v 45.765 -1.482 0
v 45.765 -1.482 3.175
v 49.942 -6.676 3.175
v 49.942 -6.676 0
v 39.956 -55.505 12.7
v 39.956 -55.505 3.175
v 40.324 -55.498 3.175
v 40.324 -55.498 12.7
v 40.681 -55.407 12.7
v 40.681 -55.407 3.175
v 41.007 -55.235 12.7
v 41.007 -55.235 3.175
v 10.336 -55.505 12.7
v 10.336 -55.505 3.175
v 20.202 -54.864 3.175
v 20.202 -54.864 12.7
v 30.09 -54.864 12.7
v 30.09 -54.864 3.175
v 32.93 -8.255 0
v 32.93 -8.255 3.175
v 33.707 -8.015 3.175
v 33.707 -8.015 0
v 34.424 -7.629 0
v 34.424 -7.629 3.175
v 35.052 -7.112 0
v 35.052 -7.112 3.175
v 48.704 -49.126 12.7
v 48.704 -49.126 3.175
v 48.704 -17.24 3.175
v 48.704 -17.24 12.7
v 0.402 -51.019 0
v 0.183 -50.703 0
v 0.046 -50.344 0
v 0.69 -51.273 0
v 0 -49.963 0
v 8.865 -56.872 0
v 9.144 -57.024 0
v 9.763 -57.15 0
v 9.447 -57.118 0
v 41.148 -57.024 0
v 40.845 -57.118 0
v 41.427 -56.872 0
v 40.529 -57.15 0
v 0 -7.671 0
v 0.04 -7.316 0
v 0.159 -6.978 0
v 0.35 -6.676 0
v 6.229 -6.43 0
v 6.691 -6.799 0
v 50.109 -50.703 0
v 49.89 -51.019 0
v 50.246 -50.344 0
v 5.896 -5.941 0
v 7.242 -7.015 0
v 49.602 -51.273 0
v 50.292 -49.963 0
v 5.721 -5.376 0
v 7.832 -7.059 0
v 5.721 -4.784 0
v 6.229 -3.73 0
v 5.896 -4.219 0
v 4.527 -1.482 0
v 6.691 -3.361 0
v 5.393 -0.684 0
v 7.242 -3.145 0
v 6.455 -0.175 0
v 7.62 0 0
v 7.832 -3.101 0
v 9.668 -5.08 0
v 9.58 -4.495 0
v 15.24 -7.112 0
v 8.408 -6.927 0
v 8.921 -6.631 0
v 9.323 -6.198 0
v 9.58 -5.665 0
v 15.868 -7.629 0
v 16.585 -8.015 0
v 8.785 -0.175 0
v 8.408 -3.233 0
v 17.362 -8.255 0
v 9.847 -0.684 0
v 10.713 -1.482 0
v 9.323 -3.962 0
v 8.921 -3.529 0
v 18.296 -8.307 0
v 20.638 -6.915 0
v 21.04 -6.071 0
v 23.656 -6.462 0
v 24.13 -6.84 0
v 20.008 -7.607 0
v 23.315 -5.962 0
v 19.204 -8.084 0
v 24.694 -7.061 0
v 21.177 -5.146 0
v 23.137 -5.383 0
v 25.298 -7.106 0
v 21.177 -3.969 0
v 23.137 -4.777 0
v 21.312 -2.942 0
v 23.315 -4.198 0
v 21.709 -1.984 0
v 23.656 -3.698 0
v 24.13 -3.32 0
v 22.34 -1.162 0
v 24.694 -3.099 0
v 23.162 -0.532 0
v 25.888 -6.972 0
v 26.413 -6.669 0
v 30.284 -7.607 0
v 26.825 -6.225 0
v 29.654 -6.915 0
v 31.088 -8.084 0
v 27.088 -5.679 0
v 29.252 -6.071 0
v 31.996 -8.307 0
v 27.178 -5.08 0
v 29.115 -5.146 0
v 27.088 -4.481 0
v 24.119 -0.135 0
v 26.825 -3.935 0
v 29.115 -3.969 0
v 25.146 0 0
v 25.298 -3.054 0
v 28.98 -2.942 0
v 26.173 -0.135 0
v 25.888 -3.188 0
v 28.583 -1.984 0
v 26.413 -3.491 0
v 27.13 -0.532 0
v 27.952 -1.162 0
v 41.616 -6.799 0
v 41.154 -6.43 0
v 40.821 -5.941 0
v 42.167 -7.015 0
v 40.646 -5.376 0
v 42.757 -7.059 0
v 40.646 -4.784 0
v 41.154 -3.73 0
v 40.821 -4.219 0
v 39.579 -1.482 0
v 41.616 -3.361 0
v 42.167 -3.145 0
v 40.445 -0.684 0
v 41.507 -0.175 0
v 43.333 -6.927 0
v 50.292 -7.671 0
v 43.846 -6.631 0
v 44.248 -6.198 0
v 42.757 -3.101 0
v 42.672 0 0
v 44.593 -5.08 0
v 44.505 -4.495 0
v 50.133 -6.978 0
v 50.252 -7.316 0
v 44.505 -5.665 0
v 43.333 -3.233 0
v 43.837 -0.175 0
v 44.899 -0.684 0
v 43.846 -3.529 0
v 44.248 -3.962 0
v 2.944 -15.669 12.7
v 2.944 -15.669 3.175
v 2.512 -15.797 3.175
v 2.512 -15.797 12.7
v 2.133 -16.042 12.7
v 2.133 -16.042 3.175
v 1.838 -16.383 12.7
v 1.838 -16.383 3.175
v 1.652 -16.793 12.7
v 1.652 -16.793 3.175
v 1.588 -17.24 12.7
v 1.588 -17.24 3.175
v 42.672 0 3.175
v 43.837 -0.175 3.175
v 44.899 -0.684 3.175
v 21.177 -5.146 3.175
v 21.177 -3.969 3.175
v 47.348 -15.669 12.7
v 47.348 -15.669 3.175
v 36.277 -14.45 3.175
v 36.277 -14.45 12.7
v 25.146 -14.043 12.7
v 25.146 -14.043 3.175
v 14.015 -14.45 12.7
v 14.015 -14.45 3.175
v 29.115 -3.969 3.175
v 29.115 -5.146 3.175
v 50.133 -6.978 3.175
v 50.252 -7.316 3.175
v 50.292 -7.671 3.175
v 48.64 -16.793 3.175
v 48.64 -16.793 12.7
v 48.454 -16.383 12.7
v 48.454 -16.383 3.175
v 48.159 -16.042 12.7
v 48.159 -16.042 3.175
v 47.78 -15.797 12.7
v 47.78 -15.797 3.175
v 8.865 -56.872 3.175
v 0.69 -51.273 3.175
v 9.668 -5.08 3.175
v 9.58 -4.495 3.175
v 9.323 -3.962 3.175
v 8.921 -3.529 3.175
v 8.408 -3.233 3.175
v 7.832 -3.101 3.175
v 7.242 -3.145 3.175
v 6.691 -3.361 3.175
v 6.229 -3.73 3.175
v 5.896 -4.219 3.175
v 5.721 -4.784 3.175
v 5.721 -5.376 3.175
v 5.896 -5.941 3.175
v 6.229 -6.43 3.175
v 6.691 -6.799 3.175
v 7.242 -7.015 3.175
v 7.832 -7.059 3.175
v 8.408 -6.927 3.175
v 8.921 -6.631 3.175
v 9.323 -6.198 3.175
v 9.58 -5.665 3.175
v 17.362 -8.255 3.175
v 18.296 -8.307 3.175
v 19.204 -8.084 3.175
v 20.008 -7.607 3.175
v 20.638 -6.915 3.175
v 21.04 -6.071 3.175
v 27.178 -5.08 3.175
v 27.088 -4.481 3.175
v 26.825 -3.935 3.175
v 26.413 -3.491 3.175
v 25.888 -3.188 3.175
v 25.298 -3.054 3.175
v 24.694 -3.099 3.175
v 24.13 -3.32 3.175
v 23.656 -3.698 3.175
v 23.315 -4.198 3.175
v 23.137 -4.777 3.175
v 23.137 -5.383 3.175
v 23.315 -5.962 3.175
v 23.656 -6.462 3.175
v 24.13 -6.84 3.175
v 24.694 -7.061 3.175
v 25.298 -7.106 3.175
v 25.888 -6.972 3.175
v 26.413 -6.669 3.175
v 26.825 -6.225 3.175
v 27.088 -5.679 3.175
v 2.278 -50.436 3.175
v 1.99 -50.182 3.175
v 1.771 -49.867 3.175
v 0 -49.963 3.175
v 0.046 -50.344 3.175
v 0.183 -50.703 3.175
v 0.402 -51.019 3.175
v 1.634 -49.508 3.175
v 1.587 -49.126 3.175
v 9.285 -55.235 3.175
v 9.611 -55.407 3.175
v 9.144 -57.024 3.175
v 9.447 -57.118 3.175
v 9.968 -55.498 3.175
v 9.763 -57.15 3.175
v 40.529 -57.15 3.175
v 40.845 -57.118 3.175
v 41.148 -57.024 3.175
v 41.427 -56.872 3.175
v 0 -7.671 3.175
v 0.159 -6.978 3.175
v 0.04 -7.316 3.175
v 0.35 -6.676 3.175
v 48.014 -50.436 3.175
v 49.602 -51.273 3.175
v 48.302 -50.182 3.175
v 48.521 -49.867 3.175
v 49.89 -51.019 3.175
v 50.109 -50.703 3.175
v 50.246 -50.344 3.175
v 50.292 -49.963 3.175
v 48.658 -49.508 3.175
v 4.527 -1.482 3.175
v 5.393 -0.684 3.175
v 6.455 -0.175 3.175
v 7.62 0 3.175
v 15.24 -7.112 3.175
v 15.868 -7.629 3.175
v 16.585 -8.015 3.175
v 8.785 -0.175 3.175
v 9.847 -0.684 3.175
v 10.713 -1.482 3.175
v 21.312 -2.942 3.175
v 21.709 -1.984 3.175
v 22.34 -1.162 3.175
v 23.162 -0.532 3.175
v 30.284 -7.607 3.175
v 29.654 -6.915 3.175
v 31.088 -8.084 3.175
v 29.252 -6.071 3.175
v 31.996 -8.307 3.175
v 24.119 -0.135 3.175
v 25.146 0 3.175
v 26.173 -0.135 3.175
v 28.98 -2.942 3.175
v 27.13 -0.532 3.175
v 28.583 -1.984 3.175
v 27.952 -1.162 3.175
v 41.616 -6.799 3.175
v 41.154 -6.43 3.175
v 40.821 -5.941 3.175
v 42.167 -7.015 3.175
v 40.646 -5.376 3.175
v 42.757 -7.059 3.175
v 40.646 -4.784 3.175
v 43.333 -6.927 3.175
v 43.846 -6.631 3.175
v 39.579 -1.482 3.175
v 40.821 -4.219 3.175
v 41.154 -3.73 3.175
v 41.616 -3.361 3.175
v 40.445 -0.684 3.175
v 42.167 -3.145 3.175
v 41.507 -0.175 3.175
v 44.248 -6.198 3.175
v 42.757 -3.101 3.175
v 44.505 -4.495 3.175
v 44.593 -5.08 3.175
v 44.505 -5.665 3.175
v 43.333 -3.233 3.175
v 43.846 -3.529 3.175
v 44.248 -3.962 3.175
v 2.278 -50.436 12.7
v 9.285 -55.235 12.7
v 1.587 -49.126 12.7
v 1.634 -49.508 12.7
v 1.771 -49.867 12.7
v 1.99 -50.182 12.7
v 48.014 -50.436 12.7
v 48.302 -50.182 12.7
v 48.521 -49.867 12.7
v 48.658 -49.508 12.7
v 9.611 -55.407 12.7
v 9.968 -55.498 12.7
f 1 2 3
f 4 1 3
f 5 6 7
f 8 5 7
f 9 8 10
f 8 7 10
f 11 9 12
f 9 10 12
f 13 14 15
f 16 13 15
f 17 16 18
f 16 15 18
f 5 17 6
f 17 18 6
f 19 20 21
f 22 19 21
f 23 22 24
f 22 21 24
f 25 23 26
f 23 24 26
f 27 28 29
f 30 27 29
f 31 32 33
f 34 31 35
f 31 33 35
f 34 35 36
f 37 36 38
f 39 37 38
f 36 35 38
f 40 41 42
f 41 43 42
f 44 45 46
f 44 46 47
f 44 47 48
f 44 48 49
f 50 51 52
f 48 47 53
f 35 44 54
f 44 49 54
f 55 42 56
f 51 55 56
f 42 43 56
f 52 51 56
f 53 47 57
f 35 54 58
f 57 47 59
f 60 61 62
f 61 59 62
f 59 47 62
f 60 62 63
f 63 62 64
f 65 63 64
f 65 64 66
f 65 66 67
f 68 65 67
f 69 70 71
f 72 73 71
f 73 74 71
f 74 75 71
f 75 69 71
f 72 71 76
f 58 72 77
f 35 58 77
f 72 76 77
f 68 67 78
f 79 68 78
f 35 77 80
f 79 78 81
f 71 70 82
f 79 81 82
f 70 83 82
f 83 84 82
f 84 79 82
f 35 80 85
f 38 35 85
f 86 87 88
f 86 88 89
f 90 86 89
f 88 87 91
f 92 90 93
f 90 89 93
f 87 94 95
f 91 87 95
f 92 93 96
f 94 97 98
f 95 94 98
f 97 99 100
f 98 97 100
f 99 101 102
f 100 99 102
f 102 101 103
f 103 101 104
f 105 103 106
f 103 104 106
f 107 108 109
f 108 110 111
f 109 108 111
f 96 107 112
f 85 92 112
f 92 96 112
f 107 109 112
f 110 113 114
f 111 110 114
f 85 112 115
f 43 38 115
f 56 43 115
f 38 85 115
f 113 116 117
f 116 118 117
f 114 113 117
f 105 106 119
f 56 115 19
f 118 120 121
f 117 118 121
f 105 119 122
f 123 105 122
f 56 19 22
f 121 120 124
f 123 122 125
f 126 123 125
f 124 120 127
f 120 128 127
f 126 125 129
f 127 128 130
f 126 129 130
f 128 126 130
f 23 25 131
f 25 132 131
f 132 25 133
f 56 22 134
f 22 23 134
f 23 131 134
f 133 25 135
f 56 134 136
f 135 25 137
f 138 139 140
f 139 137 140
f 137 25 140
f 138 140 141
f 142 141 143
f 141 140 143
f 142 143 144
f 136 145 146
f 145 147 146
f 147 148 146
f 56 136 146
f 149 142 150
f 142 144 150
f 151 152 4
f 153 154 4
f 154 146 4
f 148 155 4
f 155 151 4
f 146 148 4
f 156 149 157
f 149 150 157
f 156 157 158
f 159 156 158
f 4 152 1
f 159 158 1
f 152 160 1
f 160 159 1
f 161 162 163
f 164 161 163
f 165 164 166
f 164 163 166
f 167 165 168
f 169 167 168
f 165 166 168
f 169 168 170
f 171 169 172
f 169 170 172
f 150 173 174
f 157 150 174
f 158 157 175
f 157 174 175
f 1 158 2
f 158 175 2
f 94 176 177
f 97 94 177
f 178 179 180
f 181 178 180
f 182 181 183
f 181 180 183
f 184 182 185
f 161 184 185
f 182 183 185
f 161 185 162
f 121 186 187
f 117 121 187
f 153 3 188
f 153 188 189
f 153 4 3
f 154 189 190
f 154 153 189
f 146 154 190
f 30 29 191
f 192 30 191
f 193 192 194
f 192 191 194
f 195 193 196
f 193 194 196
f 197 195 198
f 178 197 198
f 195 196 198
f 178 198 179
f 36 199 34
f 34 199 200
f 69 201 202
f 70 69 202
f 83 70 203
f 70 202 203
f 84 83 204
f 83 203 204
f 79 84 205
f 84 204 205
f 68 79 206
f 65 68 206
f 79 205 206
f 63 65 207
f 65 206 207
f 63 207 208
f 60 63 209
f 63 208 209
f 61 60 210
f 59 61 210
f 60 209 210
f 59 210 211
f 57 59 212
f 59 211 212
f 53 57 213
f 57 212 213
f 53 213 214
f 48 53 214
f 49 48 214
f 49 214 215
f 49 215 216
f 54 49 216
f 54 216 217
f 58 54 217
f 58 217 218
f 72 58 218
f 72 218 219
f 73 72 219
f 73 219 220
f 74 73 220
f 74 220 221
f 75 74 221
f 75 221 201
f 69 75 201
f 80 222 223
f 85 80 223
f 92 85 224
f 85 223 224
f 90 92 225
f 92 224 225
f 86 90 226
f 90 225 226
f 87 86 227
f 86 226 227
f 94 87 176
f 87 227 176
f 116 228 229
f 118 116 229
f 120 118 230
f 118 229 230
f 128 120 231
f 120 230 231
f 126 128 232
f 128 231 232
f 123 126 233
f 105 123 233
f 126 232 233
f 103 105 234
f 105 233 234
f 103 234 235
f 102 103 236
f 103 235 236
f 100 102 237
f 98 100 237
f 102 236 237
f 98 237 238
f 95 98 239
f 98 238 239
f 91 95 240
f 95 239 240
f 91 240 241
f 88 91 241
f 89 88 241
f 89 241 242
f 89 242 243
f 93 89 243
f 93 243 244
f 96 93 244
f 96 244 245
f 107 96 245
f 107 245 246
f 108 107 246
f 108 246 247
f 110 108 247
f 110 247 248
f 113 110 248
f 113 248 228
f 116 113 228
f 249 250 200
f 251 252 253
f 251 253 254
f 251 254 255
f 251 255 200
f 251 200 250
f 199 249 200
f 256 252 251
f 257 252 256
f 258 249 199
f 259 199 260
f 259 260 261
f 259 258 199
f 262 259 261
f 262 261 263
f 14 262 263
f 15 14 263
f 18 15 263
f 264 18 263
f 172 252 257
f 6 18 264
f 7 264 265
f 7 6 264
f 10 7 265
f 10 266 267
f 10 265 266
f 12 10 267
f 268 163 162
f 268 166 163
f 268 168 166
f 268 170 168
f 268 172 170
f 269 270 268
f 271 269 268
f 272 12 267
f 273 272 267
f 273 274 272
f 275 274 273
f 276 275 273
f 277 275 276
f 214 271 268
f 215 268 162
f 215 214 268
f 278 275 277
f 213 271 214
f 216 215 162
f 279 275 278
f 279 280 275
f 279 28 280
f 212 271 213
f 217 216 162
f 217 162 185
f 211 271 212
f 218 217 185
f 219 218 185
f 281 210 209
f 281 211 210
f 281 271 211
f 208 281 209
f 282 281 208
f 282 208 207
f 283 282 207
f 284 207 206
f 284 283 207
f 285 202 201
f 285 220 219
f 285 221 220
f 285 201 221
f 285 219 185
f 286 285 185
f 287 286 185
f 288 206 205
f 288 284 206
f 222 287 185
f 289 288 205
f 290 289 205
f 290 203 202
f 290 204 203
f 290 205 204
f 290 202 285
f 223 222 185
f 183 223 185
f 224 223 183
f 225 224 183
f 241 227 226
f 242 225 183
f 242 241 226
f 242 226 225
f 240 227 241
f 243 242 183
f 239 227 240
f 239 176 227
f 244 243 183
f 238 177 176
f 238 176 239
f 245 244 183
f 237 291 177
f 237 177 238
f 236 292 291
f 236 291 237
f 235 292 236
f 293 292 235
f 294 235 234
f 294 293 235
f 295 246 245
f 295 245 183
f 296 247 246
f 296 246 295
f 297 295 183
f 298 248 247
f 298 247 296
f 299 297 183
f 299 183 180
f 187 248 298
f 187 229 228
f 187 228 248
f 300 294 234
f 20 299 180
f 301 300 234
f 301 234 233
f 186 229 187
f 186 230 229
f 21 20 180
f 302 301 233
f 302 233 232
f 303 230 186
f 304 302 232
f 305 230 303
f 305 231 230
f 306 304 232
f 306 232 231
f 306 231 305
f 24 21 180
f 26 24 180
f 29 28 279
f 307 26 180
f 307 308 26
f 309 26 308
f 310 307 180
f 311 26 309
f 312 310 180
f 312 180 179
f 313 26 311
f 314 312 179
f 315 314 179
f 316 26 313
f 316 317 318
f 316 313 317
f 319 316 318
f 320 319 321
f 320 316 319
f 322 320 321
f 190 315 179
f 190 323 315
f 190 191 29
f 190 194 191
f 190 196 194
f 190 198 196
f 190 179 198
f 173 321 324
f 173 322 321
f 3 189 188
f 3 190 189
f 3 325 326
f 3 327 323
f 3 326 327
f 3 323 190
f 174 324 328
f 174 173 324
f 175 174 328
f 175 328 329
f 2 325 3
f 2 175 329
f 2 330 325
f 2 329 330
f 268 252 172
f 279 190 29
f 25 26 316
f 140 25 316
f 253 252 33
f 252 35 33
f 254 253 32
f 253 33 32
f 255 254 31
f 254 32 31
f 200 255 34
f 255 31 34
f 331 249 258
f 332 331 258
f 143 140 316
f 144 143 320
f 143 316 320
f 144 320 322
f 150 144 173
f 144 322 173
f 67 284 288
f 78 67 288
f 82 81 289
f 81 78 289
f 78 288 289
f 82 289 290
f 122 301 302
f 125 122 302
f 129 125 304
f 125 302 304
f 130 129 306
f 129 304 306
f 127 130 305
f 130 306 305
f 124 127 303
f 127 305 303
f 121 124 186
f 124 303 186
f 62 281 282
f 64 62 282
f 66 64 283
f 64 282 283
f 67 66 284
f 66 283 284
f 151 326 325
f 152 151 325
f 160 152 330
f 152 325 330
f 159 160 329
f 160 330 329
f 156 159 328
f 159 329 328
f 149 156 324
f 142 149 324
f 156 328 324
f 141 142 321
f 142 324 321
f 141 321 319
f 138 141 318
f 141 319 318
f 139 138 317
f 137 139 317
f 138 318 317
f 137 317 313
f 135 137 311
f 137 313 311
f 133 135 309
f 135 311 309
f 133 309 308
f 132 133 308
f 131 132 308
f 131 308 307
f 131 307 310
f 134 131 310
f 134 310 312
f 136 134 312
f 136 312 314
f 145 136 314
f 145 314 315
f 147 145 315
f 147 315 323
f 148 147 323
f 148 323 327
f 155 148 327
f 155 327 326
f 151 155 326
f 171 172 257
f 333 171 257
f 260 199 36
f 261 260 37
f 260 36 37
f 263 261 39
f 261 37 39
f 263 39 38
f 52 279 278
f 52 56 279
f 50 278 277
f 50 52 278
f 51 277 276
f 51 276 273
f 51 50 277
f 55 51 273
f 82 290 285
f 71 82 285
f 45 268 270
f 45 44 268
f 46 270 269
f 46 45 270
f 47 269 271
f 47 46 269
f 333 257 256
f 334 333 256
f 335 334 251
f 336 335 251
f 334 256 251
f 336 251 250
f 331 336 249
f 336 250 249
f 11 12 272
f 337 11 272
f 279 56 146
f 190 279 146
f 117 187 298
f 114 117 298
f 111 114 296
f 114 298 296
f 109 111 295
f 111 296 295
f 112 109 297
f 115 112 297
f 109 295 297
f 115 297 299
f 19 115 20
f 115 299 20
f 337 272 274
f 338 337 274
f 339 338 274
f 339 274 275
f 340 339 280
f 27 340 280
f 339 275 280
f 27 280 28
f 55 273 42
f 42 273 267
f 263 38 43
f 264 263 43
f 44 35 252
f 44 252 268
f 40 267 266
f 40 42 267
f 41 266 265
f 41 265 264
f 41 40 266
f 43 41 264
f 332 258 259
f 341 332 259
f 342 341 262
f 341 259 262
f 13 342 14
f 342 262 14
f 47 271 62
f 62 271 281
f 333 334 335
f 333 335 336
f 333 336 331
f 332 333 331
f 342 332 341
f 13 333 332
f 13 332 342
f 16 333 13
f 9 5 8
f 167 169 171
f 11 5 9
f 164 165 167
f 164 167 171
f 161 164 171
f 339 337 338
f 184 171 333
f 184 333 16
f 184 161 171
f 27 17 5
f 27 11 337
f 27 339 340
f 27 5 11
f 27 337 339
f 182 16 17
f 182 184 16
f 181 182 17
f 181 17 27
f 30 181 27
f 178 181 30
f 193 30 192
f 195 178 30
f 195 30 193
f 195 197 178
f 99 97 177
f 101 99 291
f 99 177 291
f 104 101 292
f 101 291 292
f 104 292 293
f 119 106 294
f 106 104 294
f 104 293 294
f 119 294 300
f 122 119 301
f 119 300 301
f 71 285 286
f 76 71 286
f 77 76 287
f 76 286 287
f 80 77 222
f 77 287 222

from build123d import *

# Parameters (mm, degrees)
SKETCH1_W           = 50.292
SKETCH1_H           = 57.15
BOSS_EXTRUDE1_DEPTH = 3.175
SKETCH3_R           = 2.032
SKETCH3_R_2         = 1.984375
CUT_EXTRUDE1_DEPTH  = 4.175
CUT_EXTRUDE2_DEPTH  = 4.175
FILLET1_R           = 1.5875
BOSS_EXTRUDE2_DEPTH = 9.525


with BuildPart() as part:
    # Sketch1 → Boss-Extrude1 (new body)
    with BuildSketch(Plane.XY):
        with Locations((25.146, -28.575)):
            Rectangle(SKETCH1_W, SKETCH1_H)
    extrude(amount=BOSS_EXTRUDE1_DEPTH)

    # Sketch3 → Cut-Extrude1 (cut, through all)
    with BuildSketch(Plane.XY.offset(3.175)):
        with Locations((25.146, -5.08)):
            Circle(SKETCH3_R)
        with Locations((42.6085, -5.08)):
            Circle(SKETCH3_R_2)
        with Locations((7.6835, -5.08)):
            Circle(SKETCH3_R_2)
        Polygon((0, -57.15), (9.271, -57.15), (0, -50.8), align=None)
        Polygon((50.292, -50.8), (41.021, -57.15), (50.292, -57.15), align=None)
    extrude(amount=-CUT_EXTRUDE1_DEPTH, mode=Mode.SUBTRACT)

    # Sketch4 → Cut-Extrude2 (cut, through all)
    with BuildSketch(Plane.XY.offset(3.175)):
        with BuildLine():
            Line((21.17725, -5.145617642), (21.17725, -3.96875))
            ThreePointArc((21.17725, -3.96875), (22.339669962, -1.162419962), (25.146, 0))
            Line((25.146, 0), (7.62, 0))
            ThreePointArc((7.62, 0), (9.334782633, -0.389574524), (10.71291739, -1.481816429))
            Line((10.71291739, -1.481816429), (15.24, -7.112))
            ThreePointArc((15.24, -7.112), (16.21713524, -7.8392426), (17.36190992, -8.2553748))
            ThreePointArc((17.36190992, -8.2553748), (20.008184352, -7.606684967), (21.17725, -5.145617642))
        make_face()
        with BuildLine():
            Line((42.672, 0), (25.146, 0))
            ThreePointArc((25.146, 0), (27.952330038, -1.162419962), (29.11475, -3.96875))
            Line((29.11475, -3.96875), (29.11475, -5.145617642))
            ThreePointArc((29.11475, -5.145617642), (30.283815648, -7.606684967), (32.93009008, -8.2553748))
            ThreePointArc((32.93009008, -8.2553748), (34.07486476, -7.8392426), (35.052, -7.112))
            Line((35.052, -7.112), (39.57908261, -1.481816429))
            ThreePointArc((39.57908261, -1.481816429), (40.957217367, -0.389574524), (42.672, 0))
        make_face()
        with BuildLine():
            Line((50.292, 0), (42.672, 0))
            ThreePointArc((42.672, 0), (44.386782633, -0.389574524), (45.76491739, -1.481816429))
            Line((45.76491739, -1.481816429), (50.292, -7.112))
            Line((50.292, -7.112), (50.292, 0))
        make_face()
        with BuildLine():
            ThreePointArc((4.52708261, -1.481816429), (5.905217367, -0.389574524), (7.62, 0))
            Line((7.62, 0), (0, 0))
            Line((0, 0), (0, -7.112))
            Line((0, -7.112), (4.52708261, -1.481816429))
        make_face()
    extrude(amount=-CUT_EXTRUDE2_DEPTH, mode=Mode.SUBTRACT)

    # Fillet1
    fillet1_edges = [part.edges().sort_by_distance(p)[0] for p in [
        (0, -7.112, 1.5875),
        (0, -50.8, 1.5875),
        (9.271, -57.15, 1.5875),
        (41.021, -57.15, 1.5875),
        (50.292, -50.8, 1.5875),
        (50.292, -7.112, 1.5875),
    ]]
    fillet(fillet1_edges, radius=FILLET1_R)

    # Sketch6 → Boss-Extrude2 (add)
    with BuildSketch(Plane.XY.offset(3.175)):
        with BuildLine():
            Line((1.5875, -17.239611386), (1.5875, -49.126312385))
            ThreePointArc((1.5875, -49.126312385), (1.770672966, -49.86659735), (2.277921203, -50.436047428))
            Line((2.277921203, -50.436047428), (9.284630112, -55.235163118))
            ThreePointArc((9.284630112, -55.235163118), (9.786487736, -55.462944408), (10.33597995, -55.505414371))
            ThreePointArc((10.33597995, -55.505414371), (25.146, -54.784098787), (39.95602005, -55.505414371))
            ThreePointArc((39.95602005, -55.505414371), (40.505512264, -55.462944408), (41.007369888, -55.235163118))
            Line((41.007369888, -55.235163118), (48.014078797, -50.436047428))
            ThreePointArc((48.014078797, -50.436047428), (48.521327034, -49.86659735), (48.7045, -49.126312385))
            Line((48.7045, -49.126312385), (48.7045, -17.239611386))
            ThreePointArc((48.7045, -17.239611386), (48.318520542, -16.202063972), (47.348273684, -15.669048197))
            ThreePointArc((47.348273684, -15.669048197), (25.146, -14.043114413), (2.943726316, -15.669048197))
            ThreePointArc((2.943726316, -15.669048197), (1.973479458, -16.202063972), (1.5875, -17.239611386))
        make_face()
    extrude(amount=BOSS_EXTRUDE2_DEPTH)


solid = part.part
